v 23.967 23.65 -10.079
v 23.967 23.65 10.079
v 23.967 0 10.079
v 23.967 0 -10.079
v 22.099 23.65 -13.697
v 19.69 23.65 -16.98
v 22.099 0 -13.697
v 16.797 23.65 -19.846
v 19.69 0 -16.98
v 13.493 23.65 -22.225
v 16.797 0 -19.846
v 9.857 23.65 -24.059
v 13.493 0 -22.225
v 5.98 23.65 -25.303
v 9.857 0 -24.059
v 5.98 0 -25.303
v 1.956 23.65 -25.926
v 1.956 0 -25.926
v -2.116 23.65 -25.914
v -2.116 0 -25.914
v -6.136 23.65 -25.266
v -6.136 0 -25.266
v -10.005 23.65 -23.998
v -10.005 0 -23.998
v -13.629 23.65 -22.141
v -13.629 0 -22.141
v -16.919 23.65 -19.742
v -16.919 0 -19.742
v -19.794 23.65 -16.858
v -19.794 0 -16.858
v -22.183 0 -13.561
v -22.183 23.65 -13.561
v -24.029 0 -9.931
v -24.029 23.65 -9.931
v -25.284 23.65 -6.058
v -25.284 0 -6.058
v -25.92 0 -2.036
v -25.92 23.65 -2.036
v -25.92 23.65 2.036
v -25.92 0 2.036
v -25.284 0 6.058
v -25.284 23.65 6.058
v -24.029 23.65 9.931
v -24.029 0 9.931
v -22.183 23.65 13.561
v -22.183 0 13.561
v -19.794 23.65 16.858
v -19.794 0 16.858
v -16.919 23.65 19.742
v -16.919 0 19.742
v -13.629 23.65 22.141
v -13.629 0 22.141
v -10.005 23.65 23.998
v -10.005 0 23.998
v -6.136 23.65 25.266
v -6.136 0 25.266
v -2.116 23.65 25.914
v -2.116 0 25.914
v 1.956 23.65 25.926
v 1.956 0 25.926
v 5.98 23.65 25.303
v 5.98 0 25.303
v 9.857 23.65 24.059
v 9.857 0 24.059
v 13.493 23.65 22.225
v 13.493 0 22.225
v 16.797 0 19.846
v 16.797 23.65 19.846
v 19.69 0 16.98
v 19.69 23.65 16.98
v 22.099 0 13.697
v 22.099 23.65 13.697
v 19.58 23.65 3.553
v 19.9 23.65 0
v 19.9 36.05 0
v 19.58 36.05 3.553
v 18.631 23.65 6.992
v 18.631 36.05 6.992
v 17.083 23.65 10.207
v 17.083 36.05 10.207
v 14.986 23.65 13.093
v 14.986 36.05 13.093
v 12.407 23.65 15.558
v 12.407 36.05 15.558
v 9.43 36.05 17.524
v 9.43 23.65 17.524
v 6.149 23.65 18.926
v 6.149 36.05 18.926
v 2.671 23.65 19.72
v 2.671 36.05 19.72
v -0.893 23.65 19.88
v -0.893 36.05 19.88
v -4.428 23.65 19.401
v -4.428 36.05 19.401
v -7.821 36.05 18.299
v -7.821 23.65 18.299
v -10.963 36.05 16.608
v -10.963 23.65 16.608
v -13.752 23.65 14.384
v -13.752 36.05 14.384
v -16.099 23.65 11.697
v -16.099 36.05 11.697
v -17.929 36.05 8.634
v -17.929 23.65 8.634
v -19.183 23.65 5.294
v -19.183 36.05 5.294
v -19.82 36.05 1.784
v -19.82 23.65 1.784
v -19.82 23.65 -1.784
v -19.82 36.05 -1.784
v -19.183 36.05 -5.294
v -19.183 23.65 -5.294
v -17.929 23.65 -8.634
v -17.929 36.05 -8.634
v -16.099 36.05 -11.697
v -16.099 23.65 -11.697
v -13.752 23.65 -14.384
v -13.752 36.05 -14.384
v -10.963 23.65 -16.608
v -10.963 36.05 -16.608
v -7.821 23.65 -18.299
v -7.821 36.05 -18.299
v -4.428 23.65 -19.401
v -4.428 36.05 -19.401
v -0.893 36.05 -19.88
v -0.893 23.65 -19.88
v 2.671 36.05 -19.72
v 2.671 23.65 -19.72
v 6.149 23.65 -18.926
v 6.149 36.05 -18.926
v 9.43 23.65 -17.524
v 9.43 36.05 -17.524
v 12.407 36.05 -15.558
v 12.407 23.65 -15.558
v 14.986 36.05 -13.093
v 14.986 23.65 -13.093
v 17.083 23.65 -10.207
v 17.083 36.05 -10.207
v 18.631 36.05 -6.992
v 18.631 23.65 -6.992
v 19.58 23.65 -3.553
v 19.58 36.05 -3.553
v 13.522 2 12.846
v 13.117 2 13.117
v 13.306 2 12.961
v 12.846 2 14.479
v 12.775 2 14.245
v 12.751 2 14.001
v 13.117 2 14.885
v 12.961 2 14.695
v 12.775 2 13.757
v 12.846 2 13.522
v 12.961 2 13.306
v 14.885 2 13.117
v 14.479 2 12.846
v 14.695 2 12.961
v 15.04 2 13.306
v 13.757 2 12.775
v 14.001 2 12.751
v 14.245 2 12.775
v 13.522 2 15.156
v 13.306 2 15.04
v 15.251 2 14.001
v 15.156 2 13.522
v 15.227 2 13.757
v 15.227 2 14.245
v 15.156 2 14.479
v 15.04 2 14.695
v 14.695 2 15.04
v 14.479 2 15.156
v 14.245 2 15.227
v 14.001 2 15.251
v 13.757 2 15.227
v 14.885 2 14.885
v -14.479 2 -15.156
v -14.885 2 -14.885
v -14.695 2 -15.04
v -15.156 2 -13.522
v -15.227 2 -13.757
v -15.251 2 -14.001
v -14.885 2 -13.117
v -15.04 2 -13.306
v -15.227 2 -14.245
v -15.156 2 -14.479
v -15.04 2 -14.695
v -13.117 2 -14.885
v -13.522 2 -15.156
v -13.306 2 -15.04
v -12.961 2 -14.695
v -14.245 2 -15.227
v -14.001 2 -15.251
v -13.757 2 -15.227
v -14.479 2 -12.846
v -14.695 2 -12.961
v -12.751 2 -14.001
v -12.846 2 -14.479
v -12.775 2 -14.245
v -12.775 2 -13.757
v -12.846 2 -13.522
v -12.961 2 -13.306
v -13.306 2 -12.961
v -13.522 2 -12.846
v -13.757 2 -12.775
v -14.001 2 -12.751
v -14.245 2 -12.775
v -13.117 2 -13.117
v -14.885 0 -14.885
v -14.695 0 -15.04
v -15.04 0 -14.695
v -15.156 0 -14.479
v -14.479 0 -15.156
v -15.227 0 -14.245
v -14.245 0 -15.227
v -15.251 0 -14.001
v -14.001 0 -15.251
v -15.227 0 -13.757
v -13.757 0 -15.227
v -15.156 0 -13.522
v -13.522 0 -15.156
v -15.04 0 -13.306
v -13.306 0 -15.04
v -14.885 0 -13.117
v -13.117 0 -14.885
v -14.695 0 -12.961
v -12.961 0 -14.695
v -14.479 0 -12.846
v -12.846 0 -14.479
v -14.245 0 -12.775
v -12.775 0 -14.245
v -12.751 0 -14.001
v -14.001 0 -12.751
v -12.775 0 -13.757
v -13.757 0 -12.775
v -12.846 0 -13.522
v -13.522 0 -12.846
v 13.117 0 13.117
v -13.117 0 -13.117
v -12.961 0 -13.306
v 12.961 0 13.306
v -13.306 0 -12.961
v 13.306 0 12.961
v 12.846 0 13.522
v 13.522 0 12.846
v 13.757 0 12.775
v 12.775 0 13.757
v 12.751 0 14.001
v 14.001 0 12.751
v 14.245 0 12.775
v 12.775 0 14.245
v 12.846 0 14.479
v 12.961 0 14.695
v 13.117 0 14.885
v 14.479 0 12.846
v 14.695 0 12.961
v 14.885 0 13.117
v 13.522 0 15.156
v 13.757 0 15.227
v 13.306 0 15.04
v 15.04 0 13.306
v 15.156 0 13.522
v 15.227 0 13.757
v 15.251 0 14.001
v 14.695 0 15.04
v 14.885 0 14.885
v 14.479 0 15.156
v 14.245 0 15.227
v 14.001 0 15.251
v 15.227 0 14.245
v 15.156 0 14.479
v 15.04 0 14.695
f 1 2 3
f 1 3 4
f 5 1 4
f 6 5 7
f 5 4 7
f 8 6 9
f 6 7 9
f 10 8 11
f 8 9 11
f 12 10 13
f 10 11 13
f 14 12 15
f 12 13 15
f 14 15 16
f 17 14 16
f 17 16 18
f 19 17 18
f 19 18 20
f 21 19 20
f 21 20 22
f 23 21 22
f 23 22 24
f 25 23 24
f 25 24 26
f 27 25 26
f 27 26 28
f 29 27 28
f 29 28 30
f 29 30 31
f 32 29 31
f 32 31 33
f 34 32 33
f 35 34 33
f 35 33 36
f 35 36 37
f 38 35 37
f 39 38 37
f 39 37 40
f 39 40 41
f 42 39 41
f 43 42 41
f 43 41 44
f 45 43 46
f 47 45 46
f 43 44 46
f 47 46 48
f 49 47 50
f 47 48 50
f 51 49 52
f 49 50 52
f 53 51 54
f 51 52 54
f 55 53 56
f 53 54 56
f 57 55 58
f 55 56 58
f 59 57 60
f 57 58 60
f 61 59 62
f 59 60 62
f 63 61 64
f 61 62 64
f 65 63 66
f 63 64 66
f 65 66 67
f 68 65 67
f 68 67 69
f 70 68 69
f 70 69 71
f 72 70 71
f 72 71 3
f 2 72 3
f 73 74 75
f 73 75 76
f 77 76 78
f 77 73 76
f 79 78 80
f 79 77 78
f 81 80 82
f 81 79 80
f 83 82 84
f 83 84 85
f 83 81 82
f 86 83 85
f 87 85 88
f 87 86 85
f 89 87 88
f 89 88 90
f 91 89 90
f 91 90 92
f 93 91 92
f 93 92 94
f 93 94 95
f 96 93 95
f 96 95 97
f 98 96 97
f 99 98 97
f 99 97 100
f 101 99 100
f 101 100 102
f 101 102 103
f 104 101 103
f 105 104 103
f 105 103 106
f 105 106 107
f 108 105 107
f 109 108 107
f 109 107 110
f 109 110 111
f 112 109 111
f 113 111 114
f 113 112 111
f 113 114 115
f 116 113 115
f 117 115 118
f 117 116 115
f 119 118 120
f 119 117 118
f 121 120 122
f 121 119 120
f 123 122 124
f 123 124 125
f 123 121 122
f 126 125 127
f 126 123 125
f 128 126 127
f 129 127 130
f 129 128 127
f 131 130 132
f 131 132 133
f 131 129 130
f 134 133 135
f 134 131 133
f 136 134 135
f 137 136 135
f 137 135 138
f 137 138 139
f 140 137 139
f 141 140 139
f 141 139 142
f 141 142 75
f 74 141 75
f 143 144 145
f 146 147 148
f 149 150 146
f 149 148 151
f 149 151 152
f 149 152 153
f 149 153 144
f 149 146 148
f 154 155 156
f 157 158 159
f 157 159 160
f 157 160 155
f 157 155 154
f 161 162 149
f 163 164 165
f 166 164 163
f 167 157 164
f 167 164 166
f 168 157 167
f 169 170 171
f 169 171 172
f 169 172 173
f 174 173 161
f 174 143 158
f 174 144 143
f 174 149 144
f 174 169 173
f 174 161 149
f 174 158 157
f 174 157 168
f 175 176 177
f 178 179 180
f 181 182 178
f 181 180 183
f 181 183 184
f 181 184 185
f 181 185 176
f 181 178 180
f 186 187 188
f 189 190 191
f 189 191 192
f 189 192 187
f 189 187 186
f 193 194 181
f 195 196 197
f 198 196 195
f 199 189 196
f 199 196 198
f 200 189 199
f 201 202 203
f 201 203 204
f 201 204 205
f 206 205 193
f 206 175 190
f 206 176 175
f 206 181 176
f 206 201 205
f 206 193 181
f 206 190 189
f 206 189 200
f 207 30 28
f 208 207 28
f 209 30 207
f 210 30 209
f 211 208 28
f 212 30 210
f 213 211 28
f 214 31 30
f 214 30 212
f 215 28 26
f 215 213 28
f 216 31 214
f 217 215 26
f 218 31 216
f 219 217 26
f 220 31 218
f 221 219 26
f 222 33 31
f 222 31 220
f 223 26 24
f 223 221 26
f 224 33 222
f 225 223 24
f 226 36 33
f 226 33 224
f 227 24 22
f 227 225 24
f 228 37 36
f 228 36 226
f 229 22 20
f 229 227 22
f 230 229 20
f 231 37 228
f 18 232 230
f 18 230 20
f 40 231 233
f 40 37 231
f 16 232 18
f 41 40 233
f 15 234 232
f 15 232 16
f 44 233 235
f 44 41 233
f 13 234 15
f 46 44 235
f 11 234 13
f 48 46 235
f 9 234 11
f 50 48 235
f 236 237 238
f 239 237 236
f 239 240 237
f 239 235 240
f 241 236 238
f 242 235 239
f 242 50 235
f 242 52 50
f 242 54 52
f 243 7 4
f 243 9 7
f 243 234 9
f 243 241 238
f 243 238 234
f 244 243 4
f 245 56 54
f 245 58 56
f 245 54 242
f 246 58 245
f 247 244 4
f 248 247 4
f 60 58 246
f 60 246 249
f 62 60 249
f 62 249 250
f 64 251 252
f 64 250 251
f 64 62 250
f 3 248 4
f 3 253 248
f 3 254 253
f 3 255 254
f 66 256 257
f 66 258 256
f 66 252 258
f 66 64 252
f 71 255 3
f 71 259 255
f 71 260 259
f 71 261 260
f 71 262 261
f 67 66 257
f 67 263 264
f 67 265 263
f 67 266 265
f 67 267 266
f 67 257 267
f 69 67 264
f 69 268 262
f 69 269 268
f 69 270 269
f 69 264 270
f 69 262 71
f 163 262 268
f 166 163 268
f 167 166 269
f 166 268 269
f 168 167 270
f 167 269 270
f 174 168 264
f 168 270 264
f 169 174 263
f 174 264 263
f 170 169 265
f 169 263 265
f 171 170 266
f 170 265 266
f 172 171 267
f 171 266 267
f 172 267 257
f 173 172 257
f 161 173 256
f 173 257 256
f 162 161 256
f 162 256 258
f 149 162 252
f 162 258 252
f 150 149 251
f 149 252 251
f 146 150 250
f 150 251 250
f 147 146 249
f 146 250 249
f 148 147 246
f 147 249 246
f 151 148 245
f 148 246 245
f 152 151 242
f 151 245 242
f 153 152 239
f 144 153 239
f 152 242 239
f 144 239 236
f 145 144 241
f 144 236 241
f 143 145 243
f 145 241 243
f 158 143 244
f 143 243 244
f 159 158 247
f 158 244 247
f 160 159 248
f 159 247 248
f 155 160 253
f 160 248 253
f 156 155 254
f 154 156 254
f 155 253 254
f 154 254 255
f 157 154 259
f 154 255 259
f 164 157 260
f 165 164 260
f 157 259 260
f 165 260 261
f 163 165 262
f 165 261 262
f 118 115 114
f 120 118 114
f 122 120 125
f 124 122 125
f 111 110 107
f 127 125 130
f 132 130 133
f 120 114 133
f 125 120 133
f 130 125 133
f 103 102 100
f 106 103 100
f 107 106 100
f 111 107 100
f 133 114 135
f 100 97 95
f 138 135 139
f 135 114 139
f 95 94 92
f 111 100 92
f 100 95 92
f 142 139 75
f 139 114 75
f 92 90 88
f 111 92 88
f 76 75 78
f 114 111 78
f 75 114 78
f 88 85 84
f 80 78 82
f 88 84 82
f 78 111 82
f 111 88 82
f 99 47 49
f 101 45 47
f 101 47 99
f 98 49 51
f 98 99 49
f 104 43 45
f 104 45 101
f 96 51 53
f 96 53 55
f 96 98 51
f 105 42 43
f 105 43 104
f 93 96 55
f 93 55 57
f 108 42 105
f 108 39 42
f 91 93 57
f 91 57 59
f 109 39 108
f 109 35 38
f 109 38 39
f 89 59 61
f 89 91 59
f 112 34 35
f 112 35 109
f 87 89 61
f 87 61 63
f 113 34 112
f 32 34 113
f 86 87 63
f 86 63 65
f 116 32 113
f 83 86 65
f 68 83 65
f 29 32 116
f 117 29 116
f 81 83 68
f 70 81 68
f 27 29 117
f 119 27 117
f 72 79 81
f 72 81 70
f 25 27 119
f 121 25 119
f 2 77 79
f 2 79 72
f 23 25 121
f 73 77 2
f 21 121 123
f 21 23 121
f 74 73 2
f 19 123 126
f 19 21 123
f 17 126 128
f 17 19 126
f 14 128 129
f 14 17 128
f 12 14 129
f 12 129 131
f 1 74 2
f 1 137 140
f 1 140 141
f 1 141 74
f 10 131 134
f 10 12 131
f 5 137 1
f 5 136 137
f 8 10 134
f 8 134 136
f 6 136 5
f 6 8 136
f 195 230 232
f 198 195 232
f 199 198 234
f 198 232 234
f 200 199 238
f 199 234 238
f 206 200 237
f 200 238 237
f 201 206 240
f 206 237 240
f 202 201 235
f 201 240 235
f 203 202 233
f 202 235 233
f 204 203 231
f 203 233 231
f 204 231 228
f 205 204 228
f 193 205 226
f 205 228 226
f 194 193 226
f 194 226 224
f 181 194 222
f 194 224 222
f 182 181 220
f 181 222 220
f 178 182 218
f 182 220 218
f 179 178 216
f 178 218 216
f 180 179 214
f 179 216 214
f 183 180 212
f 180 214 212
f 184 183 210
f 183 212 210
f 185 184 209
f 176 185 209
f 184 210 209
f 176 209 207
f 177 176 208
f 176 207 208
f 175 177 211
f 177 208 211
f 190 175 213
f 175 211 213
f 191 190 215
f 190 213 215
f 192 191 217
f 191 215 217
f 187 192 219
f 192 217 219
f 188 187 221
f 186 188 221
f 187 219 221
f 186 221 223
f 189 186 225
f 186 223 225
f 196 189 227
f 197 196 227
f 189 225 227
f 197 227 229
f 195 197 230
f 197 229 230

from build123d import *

# Parameters (mm, degrees)
SKETCH_1_R          = 26
EXTRUDE_1_DEPTH     = 23.65
SKETCH_2_R          = 19.9
EXTRUDE_2_DEPTH     = 36.05
CUT_EXTRUDE_1_DEPTH = 36.05
SKETCH_4_R          = 1.25
CUT_EXTRUDE_2_DEPTH = 2


with BuildPart() as part:
    # 草图1 → 凸台-拉伸1 (new body)
    with BuildSketch(Plane(origin=(0, 0, 0), x_dir=(1, 0, 0), z_dir=(0, 1, 0))):
        Circle(SKETCH_1_R)
    extrude(amount=EXTRUDE_1_DEPTH)

    # 草图2 → 凸台-拉伸2 (add)
    with BuildSketch(Plane.XZ):
        Circle(SKETCH_2_R)
    extrude(amount=-EXTRUDE_2_DEPTH)

    # 草图3 → 切除-拉伸1 (cut)
    with BuildSketch(Plane.XZ):
        with BuildLine():
            Line((23.966938911, 10.078980068), (23.966938911, -10.078980068))
            ThreePointArc((23.966938911, -10.078980068), (26, 0), (23.966938911, 10.078980068))
        make_face()
    extrude(amount=-CUT_EXTRUDE_1_DEPTH, mode=Mode.SUBTRACT)

    # 草图4 → 切除-拉伸2 (cut)
    with BuildSketch(Plane.XZ):
        with Locations((-14.000714267, -14.000714267)):
            Circle(SKETCH_4_R)
        with Locations((14.000714267, 14.000714267)):
            Circle(SKETCH_4_R)
    extrude(amount=-CUT_EXTRUDE_2_DEPTH, mode=Mode.SUBTRACT)


solid = part.part
